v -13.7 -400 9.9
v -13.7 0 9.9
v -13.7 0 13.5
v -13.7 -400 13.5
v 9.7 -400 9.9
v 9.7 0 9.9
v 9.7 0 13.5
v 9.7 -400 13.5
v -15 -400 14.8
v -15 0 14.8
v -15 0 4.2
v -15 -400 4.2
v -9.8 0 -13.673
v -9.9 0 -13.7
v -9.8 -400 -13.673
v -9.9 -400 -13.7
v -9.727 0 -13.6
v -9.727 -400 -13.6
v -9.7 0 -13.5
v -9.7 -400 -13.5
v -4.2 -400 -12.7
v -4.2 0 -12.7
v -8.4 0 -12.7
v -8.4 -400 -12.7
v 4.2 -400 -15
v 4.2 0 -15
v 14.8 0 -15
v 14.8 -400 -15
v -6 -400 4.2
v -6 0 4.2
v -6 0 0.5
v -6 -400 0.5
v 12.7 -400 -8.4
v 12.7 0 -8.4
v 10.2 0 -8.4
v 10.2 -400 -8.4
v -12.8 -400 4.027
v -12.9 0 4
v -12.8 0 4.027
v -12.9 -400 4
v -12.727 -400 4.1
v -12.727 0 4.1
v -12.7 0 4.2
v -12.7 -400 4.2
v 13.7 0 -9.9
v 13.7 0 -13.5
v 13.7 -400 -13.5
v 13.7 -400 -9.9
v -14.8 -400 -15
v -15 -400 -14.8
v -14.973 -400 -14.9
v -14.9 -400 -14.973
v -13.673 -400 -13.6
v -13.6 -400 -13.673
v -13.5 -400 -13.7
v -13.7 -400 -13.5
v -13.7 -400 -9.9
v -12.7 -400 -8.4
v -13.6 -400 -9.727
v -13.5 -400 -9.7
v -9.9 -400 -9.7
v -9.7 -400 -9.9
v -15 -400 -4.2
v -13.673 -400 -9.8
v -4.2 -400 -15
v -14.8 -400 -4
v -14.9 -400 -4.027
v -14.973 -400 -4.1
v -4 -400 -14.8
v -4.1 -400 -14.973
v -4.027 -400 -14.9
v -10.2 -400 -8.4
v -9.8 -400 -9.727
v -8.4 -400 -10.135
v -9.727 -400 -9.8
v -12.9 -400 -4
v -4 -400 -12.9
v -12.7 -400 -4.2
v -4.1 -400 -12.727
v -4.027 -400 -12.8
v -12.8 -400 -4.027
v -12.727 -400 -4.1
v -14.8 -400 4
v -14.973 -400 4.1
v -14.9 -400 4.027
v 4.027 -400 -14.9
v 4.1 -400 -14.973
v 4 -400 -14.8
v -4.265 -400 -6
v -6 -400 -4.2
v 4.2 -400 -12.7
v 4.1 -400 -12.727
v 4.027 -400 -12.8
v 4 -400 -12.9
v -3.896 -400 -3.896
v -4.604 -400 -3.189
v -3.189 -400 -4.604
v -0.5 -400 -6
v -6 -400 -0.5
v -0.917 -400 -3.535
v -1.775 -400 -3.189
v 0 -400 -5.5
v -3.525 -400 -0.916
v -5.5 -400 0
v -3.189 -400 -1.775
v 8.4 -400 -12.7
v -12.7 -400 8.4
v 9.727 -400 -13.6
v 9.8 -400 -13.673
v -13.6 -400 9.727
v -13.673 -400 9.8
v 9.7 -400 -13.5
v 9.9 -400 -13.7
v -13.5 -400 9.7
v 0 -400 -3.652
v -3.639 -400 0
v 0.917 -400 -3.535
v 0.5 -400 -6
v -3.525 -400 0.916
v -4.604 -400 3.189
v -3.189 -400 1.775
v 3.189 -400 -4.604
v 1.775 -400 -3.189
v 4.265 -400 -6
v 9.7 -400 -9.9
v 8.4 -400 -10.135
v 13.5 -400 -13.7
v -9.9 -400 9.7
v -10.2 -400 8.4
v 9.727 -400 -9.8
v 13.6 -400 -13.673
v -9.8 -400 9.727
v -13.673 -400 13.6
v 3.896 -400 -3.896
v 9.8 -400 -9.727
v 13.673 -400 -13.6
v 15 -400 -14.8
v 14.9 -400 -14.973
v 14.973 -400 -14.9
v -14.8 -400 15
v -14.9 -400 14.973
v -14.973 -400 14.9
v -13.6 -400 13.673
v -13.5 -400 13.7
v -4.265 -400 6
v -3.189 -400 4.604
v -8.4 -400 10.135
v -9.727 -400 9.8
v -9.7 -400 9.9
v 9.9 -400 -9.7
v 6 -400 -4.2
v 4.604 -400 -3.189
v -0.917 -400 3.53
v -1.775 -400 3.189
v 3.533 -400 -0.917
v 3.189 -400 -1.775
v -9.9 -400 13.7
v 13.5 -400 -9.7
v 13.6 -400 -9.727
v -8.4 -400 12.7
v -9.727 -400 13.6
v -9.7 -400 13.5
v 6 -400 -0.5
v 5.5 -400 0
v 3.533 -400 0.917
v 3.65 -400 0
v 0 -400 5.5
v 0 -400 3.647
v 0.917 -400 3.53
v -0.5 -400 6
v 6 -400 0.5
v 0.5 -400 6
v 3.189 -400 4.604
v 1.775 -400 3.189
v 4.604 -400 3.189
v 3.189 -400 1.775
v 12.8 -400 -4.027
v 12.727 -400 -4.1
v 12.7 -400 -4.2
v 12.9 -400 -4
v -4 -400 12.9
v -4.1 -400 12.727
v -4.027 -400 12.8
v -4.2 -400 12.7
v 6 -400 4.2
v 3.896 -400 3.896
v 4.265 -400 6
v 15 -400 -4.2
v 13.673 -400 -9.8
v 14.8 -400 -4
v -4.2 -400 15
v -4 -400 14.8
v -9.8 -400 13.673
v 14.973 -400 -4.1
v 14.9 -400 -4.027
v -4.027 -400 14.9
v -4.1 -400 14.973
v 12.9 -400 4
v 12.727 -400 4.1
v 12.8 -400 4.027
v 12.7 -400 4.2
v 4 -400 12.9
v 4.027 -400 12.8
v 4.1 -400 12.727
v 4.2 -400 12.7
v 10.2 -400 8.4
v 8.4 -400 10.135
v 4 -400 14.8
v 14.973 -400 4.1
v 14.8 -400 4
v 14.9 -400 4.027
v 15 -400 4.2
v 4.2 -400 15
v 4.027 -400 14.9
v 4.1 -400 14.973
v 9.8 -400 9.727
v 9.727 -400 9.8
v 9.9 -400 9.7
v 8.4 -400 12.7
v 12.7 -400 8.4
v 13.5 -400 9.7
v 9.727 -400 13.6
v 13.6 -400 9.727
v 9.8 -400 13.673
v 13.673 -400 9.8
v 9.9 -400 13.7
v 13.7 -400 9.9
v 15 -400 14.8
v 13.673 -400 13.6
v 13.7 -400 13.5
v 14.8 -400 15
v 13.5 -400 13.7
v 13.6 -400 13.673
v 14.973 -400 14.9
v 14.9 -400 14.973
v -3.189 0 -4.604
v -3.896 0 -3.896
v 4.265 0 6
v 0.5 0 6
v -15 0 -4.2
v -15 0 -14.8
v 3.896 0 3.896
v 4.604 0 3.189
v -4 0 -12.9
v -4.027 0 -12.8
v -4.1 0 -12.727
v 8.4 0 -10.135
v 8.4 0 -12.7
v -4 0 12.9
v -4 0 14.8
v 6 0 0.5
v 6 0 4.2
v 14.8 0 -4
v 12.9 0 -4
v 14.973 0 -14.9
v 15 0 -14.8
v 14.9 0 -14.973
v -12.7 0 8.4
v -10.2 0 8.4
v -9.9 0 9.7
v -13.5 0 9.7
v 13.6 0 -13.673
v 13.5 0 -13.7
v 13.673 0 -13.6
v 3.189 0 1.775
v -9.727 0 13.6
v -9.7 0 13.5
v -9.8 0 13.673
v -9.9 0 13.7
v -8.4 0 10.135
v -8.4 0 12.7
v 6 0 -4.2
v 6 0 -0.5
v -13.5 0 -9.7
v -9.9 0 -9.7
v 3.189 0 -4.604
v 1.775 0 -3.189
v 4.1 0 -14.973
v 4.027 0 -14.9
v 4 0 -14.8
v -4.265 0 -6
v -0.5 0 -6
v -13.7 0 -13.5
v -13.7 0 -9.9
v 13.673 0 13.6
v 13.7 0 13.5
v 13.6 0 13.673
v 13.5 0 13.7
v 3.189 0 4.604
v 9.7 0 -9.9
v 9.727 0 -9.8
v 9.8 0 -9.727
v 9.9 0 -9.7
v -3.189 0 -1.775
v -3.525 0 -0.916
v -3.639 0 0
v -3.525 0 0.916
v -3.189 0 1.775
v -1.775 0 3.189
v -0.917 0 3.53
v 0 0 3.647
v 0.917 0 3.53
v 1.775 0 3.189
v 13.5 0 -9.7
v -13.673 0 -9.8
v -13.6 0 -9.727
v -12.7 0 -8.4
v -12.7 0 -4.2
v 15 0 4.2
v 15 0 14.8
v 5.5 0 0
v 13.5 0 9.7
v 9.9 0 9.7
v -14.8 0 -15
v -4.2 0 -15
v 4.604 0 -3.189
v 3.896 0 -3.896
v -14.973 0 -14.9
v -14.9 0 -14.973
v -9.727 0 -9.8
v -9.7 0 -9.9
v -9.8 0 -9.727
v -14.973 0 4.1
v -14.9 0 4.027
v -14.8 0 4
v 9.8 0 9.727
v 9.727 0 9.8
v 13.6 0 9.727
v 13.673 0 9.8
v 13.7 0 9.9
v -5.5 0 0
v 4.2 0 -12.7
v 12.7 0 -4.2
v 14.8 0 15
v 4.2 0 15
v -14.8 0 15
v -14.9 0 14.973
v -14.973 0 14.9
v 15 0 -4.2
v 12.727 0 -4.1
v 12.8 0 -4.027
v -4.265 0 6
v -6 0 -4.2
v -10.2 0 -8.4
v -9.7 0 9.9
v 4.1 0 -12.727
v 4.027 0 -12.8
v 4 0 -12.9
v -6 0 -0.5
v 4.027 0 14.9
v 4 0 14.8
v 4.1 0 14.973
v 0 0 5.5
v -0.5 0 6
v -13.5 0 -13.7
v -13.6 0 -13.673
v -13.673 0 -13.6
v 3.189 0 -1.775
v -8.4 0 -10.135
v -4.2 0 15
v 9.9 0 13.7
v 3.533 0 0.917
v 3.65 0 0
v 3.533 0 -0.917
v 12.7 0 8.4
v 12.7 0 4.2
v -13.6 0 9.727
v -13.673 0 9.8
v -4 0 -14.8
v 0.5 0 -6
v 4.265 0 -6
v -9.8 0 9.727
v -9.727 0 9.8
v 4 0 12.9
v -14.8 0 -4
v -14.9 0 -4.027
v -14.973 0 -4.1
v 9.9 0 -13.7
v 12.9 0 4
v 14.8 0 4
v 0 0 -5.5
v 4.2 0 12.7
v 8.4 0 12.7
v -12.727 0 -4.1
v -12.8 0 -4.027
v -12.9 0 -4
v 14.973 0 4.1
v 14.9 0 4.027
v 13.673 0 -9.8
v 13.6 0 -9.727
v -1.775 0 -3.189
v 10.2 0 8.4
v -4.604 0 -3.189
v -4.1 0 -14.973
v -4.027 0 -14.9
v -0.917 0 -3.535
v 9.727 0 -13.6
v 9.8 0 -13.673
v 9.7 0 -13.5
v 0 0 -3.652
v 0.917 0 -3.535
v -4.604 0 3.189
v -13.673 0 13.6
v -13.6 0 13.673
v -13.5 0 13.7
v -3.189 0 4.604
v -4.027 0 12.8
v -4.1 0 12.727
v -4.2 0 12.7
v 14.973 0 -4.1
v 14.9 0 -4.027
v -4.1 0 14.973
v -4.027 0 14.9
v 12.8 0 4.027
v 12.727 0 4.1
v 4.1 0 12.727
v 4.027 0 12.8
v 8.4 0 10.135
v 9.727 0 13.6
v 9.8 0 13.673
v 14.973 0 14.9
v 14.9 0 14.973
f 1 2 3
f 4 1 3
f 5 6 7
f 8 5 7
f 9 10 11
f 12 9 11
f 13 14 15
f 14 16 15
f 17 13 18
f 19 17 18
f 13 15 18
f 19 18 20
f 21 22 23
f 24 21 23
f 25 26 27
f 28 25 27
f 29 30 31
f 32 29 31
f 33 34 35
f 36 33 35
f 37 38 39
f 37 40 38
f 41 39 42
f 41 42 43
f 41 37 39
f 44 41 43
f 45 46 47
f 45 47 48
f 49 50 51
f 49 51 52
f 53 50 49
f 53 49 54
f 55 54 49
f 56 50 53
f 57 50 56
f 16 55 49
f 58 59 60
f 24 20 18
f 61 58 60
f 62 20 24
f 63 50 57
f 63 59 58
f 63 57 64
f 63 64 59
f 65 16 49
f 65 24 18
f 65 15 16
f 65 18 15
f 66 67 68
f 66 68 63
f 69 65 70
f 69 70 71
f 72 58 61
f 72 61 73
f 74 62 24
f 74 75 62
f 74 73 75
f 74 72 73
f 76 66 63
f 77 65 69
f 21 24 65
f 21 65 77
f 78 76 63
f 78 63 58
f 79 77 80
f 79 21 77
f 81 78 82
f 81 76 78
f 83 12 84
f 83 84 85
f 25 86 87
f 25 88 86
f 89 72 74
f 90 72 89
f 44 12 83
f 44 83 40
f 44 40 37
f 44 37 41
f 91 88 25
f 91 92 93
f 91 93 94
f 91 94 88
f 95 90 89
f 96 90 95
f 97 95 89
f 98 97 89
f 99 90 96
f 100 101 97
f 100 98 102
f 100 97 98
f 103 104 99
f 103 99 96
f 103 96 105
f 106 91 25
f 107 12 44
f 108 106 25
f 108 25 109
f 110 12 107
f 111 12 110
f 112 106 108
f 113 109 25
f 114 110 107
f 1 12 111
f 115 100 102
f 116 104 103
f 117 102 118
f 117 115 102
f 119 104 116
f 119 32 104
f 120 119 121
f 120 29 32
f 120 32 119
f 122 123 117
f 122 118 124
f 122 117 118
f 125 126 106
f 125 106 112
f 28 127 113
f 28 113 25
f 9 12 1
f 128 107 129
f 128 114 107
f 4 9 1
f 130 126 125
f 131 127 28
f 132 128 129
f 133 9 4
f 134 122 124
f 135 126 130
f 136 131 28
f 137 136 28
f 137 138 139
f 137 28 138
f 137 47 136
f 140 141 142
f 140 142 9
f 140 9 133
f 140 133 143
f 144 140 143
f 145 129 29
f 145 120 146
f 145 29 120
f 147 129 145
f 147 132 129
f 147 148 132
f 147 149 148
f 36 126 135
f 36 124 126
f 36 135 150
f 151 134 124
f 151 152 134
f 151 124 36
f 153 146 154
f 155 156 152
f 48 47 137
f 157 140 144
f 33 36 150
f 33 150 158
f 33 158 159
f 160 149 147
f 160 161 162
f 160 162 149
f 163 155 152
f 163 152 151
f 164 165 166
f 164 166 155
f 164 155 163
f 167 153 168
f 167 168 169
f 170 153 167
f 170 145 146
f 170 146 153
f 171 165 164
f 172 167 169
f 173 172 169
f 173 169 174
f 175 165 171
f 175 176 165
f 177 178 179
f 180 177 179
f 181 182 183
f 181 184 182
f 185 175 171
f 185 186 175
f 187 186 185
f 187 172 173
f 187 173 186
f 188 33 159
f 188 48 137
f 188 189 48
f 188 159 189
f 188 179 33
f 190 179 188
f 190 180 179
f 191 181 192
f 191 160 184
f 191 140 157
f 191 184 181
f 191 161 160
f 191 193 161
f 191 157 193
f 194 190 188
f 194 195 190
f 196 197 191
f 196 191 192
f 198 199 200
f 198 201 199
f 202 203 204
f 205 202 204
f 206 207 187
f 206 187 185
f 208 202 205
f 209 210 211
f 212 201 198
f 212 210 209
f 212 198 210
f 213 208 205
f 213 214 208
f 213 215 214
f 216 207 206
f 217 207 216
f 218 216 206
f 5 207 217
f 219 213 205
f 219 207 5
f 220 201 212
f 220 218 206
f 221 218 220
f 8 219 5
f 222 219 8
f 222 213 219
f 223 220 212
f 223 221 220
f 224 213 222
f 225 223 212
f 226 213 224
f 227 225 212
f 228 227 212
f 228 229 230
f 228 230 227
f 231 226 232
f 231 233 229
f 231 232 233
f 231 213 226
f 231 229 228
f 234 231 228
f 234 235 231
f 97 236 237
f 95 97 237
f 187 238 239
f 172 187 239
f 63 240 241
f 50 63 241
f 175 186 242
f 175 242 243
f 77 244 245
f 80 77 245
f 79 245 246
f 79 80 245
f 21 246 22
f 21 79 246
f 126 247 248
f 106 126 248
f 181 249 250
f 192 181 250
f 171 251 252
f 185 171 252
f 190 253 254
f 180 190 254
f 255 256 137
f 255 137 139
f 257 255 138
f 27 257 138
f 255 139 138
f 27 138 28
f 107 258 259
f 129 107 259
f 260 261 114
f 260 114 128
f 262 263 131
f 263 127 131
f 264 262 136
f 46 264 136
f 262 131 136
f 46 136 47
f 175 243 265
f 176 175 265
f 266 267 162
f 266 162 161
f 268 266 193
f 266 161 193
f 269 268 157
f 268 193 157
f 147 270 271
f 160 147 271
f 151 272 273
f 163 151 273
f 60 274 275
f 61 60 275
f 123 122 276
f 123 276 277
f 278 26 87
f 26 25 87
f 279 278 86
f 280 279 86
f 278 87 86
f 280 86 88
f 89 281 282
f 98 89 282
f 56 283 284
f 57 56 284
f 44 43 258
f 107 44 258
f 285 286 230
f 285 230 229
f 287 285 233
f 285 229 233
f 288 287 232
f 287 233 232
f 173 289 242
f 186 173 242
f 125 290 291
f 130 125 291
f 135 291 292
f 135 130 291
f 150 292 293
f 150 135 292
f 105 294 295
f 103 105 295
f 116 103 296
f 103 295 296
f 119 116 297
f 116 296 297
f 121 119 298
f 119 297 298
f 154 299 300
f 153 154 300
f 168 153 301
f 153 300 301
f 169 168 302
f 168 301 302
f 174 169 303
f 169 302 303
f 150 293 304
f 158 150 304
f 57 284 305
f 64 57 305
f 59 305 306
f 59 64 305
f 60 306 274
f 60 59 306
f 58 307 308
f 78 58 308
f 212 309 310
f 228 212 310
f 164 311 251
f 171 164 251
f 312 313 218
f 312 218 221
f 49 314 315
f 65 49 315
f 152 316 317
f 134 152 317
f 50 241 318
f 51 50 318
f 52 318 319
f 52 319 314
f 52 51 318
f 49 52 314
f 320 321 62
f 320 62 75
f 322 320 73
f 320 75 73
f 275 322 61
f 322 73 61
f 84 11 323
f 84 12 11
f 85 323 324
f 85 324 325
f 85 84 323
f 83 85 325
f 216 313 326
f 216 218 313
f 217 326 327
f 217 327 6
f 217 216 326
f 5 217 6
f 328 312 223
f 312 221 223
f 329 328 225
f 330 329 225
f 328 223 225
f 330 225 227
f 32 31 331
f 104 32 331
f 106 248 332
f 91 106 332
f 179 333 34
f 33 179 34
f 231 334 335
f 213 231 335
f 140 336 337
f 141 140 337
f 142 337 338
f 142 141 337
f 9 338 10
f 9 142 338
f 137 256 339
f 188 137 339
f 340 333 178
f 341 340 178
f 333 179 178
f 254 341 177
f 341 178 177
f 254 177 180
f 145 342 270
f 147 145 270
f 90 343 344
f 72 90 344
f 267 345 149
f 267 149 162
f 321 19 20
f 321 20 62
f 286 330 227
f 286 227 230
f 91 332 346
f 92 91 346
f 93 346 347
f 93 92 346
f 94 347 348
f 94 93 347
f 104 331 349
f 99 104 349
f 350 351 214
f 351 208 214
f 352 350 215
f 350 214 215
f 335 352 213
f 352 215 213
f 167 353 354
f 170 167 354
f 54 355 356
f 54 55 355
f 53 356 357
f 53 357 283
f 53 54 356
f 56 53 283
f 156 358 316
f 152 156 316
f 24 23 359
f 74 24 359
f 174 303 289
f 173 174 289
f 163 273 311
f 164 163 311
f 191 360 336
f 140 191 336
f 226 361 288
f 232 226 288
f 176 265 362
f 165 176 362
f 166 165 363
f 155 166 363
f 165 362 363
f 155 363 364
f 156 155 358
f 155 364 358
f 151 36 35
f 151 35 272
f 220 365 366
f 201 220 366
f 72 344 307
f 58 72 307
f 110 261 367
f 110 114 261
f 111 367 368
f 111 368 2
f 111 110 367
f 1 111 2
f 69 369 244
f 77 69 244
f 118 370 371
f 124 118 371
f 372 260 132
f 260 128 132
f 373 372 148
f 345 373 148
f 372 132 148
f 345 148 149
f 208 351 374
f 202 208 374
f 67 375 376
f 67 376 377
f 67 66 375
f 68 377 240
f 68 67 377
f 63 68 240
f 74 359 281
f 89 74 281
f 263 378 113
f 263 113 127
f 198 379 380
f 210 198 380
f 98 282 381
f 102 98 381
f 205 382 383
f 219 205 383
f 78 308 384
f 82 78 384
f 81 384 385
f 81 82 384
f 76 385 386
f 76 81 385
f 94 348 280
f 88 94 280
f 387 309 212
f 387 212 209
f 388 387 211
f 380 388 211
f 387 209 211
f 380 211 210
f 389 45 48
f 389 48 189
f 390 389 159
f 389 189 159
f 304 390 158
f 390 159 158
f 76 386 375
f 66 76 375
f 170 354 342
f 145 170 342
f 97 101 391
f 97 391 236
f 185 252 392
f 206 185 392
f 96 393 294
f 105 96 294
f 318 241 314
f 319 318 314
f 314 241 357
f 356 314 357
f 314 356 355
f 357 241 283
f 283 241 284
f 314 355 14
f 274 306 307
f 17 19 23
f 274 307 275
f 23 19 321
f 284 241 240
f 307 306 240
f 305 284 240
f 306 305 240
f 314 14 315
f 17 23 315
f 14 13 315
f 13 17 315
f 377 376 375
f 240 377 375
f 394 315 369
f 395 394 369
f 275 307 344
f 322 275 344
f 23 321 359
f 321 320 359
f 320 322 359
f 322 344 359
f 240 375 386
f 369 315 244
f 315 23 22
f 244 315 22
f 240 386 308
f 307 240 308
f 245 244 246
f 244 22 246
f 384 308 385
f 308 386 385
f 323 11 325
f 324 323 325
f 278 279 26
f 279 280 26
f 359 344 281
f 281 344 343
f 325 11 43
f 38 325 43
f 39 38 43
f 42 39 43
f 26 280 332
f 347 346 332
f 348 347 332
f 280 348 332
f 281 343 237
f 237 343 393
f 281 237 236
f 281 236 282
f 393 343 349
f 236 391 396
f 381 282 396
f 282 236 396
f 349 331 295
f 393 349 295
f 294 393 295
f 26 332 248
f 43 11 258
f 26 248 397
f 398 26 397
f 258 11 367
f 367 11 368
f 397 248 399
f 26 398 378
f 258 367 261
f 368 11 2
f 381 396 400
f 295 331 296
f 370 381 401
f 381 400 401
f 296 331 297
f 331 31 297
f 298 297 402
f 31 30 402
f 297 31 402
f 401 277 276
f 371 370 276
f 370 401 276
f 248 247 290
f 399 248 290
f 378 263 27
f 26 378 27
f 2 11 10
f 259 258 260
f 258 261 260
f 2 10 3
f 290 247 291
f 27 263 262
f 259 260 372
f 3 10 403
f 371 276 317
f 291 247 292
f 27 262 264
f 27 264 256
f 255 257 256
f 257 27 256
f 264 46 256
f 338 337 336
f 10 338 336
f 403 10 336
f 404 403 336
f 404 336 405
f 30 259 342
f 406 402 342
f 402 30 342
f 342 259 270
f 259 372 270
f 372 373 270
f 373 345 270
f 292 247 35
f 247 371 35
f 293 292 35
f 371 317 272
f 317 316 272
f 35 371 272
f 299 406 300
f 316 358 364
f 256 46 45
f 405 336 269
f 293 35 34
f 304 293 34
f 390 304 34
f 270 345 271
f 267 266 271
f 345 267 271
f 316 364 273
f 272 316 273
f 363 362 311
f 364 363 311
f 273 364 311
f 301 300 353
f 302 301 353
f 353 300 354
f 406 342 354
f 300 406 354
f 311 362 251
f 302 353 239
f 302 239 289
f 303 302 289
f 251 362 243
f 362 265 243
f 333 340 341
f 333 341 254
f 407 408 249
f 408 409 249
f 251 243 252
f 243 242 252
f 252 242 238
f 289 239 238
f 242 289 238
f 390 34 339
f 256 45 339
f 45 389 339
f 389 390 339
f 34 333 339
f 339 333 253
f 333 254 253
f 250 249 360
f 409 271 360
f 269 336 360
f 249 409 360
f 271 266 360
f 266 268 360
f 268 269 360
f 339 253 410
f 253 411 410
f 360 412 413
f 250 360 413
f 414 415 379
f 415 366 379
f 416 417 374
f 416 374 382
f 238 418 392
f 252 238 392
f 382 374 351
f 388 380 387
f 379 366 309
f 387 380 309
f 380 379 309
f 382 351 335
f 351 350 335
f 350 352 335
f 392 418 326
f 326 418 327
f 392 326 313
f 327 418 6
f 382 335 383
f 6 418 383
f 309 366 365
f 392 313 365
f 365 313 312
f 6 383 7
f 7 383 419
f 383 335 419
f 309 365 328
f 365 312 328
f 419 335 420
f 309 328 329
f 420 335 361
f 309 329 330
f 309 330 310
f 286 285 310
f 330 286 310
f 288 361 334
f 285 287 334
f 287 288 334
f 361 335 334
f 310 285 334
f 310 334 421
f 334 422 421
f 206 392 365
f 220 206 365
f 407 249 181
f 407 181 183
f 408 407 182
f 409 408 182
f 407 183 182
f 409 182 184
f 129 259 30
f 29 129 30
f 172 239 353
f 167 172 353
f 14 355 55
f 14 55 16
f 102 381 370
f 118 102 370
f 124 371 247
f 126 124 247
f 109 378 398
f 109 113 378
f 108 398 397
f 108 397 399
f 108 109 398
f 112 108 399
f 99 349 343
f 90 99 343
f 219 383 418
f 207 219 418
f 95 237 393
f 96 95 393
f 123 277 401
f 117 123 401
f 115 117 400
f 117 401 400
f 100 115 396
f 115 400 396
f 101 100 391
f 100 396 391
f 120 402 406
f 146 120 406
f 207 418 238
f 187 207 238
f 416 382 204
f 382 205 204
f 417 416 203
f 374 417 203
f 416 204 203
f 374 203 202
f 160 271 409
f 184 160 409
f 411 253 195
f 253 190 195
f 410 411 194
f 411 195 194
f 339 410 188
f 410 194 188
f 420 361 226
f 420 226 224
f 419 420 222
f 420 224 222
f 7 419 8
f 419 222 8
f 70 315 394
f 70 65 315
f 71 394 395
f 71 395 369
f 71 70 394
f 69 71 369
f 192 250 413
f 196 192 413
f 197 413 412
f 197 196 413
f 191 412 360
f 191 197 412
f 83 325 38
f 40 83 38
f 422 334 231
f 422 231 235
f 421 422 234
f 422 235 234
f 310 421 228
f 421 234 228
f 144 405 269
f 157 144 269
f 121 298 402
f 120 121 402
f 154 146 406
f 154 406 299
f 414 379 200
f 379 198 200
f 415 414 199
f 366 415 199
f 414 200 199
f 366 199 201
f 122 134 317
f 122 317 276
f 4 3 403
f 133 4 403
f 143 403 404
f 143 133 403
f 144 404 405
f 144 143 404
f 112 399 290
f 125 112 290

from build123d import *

# Parameters (mm, degrees)
F0_W     = 4
F0_H     = 4
F1_DEPTH = 400
F2_R     = 0.2


# Not quite as in the source:
# - ends of sketch curves that miss each other by under 0.0002 mm in the source are joined


with BuildPart() as f1:
    # F0 (on Front) → F1 (new body)
    with BuildSketch(Plane.XZ):
        Polygon((-4, 12.7), (-4, 15), (-15, 15), (-15, 4), (-12.7, 4), (-12.7, 8.4000005318), (-10.2000002146, 8.4000002226), (-5.9999986286, 4.1999975978), (-5.9999986286, 0.5), (-5.4999986286, 0), (-5.9999986286, -0.5), (-5.9999986286, -4.1999975978), (-10.2000002146, -8.4000002226), (-12.7, -8.4000005401), (-12.7, -4), (-15, -4), (-15, -15), (-4, -15), (-4, -12.7), (-8.4, -12.7), (-8.4, -10.1349351573), (-4.265066287, -6.0000004215), (-0.5, -6.0000004215), (0, -5.5000004215), (0.5, -6.0000004215), (4.265066287, -6.0000004215), (8.4, -10.1349351573), (8.4, -12.7), (4, -12.7), (4, -15), (15, -15), (15, -4), (12.7, -4), (12.7, -8.4000005318), (10.2000002146, -8.4000002143), (5.9999986286, -4.1999975978), (5.9999986286, -0.5), (5.4999986286, 0), (5.9999986286, 0.5), (5.9999986286, 4.1999975978), (10.2000002146, 8.4000002226), (12.7, 8.4000005318), (12.7, 4), (15, 4), (15, 15), (4, 15), (4, 12.7), (8.4, 12.7), (8.4, 10.1349351573), (4.265066287, 6.0000004215), (0.5, 6.0000004215), (0, 5.5000004215), (-0.5, 6.0000004215), (-4.265066287, 6.0000004215), (-8.4, 10.1349351573), (-8.4, 12.7), align=None)
        with Locations((-11.7, -11.7000005318)):
            Rectangle(F0_W, F0_H, mode=Mode.SUBTRACT)
        with Locations((11.7, -11.7000005318)):
            Rectangle(F0_W, F0_H, mode=Mode.SUBTRACT)
        with BuildLine():
            Line((-3.1892931549, 1.7750800467), (-4.6035065879, 3.1892937385))
            Line((-4.6035065879, 3.1892937385), (-3.896399742, 3.896400455))
            Line((-3.896399742, 3.896400455), (-3.1892928961, 4.6035071715))
            Line((-3.1892928961, 4.6035071715), (-1.7750794631, 3.1892934797))
            ThreePointArc((-1.7750794631, 3.1892934797), (-5.13e-08, 3.6466421089), (1.7750793605, 3.1892934797))
            Line((1.7750793605, 3.1892934797), (3.1892927707, 4.6035071942))
            Line((3.1892927707, 4.6035071942), (3.896399628, 3.8964004891))
            Line((3.896399628, 3.8964004891), (4.6035064852, 3.189293784))
            Line((4.6035064852, 3.189293784), (3.189293075, 1.7750800695))
            ThreePointArc((3.189293075, 1.7750800695), (3.6502008105, 3.145e-07), (3.189293075, -1.7750794404))
            Line((3.189293075, -1.7750794404), (4.6035060628, -3.1892944964))
            Line((4.6035060628, -3.1892944964), (3.8964005729, -3.8963996238))
            Line((3.8964005729, -3.8963996238), (3.1892938779, -4.6035064911))
            Line((3.1892938779, -4.6035064911), (1.775078938, -3.189293772))
            ThreePointArc((1.775078938, -3.189293772), (8.169e-07, -3.6522284465), (-1.775078938, -3.189293772))
            Line((-1.775078938, -3.189293772), (-3.1892921382, -4.6035076966))
            Line((-3.1892921382, -4.6035076966), (-3.8964003567, -3.8964000069))
            Line((-3.8964003567, -3.8964000069), (-4.6035070554, -3.1892931432))
            Line((-4.6035070554, -3.1892931432), (-3.1892931549, -1.7750794631))
            ThreePointArc((-3.1892931549, -1.7750794631), (-3.6388745209, 2.918e-07), (-3.1892931549, 1.7750800467))
        make_face(mode=Mode.SUBTRACT)
        with Locations((-11.7, 11.7000005318)):
            Rectangle(F0_W, F0_H, mode=Mode.SUBTRACT)
        with Locations((11.7, 11.7000005318)):
            Rectangle(F0_W, F0_H, mode=Mode.SUBTRACT)
    extrude(amount=F1_DEPTH)

    # F2
    f2_edges = [f1.edges().sort_by_distance(p)[0] for p in [
        (-4, -200, 15),
        (4, -200, 15),
        (-15, -200, 15),
        (15, -200, 15),
        (-12.7, -200, 4),
        (-15, -200, 4),
        (-15, -200, -4),
        (-15, -200, -15),
        (-4, -200, -15),
        (-4, -200, -12.7),
        (-12.7, -200, -4),
        (4, -200, -15),
        (15, -200, -15),
        (12.7, -200, -4),
        (12.7, -200, 4),
        (15, -200, -4),
        (15, -200, 4),
        (-4, -200, 12.7),
        (4, -200, -12.7),
        (4, -200, 12.7),
        (9.7, -200, 13.700001),
        (-13.7, -200, 13.700001),
        (-13.7, -200, -9.700001),
        (9.7, -200, -9.700001),
        (-9.7, -200, 9.700001),
        (-9.7, -200, -13.700001),
        (13.7, -200, -13.700001),
        (13.7, -200, 9.700001),
        (13.7, -200, 13.700001),
        (-9.7, -200, 13.700001),
        (-9.7, -200, -9.700001),
        (13.7, -200, -9.700001),
        (9.7, -200, 9.700001),
        (-13.7, -200, 9.700001),
        (9.7, -200, -13.700001),
        (-13.7, -200, -13.700001),
    ]]
    fillet(f2_edges, radius=F2_R)


solid = f1.part
